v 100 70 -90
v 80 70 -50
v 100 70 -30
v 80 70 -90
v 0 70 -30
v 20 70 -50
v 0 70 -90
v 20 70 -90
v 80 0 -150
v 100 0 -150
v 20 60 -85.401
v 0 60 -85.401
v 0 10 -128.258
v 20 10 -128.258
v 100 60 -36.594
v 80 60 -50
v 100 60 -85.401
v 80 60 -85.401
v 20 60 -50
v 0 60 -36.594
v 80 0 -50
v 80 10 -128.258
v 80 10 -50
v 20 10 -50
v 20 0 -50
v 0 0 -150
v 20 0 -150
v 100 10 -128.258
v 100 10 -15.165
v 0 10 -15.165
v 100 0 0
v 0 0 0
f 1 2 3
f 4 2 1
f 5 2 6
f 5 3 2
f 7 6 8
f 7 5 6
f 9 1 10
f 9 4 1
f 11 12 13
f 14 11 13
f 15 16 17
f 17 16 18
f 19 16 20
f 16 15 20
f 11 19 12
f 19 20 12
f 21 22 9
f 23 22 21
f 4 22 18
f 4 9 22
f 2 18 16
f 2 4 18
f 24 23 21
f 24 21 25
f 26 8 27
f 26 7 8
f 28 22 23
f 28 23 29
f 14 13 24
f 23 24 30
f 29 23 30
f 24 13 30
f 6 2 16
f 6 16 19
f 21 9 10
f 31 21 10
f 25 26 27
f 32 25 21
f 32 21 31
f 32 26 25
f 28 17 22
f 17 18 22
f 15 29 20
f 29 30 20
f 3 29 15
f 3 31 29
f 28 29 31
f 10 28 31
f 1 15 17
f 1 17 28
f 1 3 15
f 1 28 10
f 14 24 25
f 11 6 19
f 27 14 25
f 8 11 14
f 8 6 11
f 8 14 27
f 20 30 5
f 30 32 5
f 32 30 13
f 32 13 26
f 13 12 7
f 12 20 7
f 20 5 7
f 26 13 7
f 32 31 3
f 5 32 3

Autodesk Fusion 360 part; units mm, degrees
sketch "Sketch2" plane through (0, 0, 0) normal (1, 0, 0) x (0, 0, -1)
  line L0 (0, 0) -> (30, 70)
  line L1 (30, 70) -> (90, 70)
  line L2 (90, 70) -> (150, 0)
  line L3 (150, 0) -> (0, 0)
  line L4 (36.594, 60) -> (85.4007, 60)
  line L5 (85.4007, 60) -> (128.2578, 10)
  line L6 (128.2578, 10) -> (15.1654, 10)
  line L7 (15.1654, 10) -> (36.594, 60)
  dimension "d9" = 10
  dimension "d10" = 70
  dimension "d11" = 30
  dimension "d12" = 60
  dimension "d13" = 60
extrude "Extrude1" add sketch "Sketch2" along normal blind 100
sketch "Sketch3" plane through (0, 70, 0) normal (0, 1, 0) x (-1, 0, 0)
  line L0 (0, -90) -> (0, -30)
  line L1 (0, -30) -> (-100, -30)
  line L2 (-100, -30) -> (-100, -90)
  line L3 (-100, -90) -> (0, -90)
  line L4 (-100, -30) -> (0, -30) construction
  line L5 (-50, -30) -> (-50, -100) construction
  line L6 (-20, -150) -> (-80, -150)
  line L7 (-80, -150) -> (-80, -50)
  line L8 (-80, -50) -> (-20, -50)
  line L9 (-20, -50) -> (-20, -150)
  line L10 (-20, -150) -> (-80, -50) construction
  line L11 (-80, -150) -> (-20, -50) construction
  point P0 (-50, -100)
  dimension "d19" = 70
  dimension "d20" = 60
  dimension "d21" = 100
extrude "Extrude2" cut sketch "Sketch3" against normal through all contours L3 L6 L7 L9 | L3 L7 L8 L9
